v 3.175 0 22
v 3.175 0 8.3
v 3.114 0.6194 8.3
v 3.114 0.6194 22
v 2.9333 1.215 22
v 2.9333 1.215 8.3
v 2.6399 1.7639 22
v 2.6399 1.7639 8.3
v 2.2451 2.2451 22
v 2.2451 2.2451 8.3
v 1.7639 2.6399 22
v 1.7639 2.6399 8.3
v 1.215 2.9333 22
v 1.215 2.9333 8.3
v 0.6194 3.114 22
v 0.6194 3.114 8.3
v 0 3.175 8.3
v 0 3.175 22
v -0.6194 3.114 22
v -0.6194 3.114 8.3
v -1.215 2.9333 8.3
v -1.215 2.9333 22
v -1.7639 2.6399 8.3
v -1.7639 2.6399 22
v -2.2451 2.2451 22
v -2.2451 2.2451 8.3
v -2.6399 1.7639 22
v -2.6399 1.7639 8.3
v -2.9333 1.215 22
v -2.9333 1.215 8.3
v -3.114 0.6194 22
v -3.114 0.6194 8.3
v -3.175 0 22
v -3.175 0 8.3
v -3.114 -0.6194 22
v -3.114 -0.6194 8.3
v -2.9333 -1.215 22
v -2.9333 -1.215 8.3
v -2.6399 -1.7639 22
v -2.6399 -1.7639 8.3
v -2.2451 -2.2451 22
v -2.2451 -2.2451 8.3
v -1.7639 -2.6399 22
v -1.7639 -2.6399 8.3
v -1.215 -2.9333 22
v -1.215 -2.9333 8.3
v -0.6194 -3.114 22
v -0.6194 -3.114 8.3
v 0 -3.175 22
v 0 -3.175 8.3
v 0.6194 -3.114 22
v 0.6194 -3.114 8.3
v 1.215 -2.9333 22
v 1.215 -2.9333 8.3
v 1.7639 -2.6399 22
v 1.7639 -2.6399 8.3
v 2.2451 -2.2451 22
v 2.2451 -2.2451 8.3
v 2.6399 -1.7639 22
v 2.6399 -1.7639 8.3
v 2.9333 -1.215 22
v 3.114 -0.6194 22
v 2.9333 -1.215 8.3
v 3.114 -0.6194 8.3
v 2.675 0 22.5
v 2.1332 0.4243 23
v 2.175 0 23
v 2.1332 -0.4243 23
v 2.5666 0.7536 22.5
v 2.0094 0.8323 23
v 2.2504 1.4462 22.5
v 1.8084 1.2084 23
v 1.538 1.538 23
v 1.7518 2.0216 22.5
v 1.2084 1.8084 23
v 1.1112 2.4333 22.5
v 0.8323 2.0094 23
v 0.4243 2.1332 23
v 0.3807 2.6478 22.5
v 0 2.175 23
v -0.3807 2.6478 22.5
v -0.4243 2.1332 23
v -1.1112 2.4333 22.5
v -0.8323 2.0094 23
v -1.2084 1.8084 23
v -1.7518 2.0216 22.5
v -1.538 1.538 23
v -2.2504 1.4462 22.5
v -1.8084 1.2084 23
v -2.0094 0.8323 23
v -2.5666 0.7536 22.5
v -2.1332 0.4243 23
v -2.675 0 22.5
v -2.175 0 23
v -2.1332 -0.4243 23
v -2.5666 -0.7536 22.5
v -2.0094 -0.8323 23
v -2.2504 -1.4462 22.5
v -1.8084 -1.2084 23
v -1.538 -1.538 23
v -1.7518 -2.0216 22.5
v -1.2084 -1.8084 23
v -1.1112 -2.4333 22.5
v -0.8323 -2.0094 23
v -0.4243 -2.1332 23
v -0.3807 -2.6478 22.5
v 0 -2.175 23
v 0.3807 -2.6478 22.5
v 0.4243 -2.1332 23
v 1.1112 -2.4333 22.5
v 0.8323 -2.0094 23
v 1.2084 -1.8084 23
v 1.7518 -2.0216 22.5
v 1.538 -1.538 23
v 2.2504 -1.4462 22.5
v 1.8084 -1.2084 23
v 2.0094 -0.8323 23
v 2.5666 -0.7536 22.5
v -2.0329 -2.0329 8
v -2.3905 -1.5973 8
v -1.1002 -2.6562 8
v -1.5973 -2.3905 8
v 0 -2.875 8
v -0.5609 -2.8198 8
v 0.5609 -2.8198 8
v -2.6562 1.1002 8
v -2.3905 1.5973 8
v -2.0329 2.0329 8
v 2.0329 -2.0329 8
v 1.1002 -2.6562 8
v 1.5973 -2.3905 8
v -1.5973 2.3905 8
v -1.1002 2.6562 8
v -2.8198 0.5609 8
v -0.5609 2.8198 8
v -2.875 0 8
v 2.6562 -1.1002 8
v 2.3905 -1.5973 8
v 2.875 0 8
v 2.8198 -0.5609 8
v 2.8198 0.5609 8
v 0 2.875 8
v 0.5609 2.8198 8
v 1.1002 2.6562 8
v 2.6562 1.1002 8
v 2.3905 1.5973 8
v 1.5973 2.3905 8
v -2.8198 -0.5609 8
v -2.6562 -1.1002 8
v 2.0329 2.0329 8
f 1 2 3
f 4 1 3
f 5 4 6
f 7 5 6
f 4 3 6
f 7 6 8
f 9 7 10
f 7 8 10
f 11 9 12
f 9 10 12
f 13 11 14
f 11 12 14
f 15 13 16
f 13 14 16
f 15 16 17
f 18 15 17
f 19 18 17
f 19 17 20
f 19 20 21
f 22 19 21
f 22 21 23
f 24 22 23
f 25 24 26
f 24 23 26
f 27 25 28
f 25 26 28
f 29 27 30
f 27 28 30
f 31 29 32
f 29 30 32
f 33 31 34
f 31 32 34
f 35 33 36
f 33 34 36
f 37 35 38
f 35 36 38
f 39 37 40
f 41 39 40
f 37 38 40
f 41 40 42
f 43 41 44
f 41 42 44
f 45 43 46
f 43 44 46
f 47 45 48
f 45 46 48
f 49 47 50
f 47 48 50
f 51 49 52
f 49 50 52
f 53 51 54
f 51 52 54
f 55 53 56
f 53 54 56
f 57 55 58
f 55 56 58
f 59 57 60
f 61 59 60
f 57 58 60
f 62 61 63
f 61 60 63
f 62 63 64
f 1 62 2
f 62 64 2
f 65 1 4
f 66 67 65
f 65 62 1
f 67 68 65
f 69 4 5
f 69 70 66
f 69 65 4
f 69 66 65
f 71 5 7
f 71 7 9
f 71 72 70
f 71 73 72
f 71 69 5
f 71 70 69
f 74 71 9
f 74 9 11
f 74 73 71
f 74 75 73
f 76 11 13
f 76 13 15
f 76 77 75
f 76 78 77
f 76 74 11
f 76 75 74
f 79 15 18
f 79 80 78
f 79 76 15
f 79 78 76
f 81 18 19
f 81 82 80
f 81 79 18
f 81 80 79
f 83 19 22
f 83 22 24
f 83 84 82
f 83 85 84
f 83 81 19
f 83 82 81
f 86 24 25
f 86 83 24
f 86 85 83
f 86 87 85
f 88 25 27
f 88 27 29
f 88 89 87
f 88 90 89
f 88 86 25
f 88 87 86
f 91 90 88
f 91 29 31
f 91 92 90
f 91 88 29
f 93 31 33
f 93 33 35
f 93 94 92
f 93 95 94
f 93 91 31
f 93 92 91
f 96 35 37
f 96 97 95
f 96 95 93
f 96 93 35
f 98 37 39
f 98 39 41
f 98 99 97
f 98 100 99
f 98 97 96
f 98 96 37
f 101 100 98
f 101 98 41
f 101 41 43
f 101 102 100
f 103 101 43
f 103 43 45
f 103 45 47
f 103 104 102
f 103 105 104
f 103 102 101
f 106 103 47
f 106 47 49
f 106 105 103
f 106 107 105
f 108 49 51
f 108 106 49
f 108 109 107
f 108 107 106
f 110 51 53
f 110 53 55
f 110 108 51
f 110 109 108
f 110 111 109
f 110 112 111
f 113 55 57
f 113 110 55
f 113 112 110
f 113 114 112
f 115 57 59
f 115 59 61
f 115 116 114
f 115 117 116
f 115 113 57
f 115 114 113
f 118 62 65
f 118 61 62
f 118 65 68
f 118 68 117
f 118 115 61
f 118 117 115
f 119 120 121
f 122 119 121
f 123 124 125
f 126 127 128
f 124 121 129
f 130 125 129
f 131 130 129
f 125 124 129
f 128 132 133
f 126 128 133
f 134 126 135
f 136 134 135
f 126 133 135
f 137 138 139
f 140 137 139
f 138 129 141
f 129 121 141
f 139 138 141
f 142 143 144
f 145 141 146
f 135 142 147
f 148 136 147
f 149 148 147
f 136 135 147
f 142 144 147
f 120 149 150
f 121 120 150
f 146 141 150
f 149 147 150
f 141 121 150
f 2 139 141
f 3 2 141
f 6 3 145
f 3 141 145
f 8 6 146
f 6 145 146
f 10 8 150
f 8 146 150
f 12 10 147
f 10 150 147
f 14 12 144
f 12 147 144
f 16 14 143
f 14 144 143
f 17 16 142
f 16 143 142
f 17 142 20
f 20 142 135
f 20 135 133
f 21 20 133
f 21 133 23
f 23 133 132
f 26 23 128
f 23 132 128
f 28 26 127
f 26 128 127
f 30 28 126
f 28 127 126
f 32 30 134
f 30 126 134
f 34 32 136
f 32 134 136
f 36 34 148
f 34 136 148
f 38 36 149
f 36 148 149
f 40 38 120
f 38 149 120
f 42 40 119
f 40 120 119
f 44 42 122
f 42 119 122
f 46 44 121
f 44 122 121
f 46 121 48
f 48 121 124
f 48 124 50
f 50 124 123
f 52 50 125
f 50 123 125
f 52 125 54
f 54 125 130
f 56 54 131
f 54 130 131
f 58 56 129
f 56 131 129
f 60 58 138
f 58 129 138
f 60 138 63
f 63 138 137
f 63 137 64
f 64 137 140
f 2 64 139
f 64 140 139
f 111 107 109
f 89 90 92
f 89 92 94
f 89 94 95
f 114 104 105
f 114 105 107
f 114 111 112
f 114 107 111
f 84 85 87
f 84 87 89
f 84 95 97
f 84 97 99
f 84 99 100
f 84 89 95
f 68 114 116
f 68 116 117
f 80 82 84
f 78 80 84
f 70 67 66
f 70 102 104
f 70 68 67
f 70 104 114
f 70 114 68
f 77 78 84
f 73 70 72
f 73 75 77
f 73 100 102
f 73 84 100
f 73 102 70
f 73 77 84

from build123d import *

# Parameters (mm, degrees)
SKETCH022_R     = 3.175
PAD011_DEPTH    = 15
CHAMFER_SIZE    = 0.3
CHAMFER001_SIZE = 1


with BuildPart() as part:
    # Sketch022 → Pad011 (new body)
    with BuildSketch(Plane.XY):
        Circle(SKETCH022_R)
    extrude(amount=PAD011_DEPTH)

    # Chamfer
    chamfer_edges = [part.edges().sort_by_distance(p)[0] for p in [
        (-3.175, 0, 0),
    ]]
    chamfer(chamfer_edges, length=CHAMFER_SIZE)

    # Chamfer001
    chamfer001_edges = [part.edges().sort_by_distance(p)[0] for p in [
        (-3.175, 0, 15),
    ]]
    chamfer(chamfer001_edges, length=CHAMFER001_SIZE)


with BuildPart() as part_1:
    # Body003003 placement: moved
    add(part.part.moved(Location((0, 0, 8))))


solid = part_1.part
